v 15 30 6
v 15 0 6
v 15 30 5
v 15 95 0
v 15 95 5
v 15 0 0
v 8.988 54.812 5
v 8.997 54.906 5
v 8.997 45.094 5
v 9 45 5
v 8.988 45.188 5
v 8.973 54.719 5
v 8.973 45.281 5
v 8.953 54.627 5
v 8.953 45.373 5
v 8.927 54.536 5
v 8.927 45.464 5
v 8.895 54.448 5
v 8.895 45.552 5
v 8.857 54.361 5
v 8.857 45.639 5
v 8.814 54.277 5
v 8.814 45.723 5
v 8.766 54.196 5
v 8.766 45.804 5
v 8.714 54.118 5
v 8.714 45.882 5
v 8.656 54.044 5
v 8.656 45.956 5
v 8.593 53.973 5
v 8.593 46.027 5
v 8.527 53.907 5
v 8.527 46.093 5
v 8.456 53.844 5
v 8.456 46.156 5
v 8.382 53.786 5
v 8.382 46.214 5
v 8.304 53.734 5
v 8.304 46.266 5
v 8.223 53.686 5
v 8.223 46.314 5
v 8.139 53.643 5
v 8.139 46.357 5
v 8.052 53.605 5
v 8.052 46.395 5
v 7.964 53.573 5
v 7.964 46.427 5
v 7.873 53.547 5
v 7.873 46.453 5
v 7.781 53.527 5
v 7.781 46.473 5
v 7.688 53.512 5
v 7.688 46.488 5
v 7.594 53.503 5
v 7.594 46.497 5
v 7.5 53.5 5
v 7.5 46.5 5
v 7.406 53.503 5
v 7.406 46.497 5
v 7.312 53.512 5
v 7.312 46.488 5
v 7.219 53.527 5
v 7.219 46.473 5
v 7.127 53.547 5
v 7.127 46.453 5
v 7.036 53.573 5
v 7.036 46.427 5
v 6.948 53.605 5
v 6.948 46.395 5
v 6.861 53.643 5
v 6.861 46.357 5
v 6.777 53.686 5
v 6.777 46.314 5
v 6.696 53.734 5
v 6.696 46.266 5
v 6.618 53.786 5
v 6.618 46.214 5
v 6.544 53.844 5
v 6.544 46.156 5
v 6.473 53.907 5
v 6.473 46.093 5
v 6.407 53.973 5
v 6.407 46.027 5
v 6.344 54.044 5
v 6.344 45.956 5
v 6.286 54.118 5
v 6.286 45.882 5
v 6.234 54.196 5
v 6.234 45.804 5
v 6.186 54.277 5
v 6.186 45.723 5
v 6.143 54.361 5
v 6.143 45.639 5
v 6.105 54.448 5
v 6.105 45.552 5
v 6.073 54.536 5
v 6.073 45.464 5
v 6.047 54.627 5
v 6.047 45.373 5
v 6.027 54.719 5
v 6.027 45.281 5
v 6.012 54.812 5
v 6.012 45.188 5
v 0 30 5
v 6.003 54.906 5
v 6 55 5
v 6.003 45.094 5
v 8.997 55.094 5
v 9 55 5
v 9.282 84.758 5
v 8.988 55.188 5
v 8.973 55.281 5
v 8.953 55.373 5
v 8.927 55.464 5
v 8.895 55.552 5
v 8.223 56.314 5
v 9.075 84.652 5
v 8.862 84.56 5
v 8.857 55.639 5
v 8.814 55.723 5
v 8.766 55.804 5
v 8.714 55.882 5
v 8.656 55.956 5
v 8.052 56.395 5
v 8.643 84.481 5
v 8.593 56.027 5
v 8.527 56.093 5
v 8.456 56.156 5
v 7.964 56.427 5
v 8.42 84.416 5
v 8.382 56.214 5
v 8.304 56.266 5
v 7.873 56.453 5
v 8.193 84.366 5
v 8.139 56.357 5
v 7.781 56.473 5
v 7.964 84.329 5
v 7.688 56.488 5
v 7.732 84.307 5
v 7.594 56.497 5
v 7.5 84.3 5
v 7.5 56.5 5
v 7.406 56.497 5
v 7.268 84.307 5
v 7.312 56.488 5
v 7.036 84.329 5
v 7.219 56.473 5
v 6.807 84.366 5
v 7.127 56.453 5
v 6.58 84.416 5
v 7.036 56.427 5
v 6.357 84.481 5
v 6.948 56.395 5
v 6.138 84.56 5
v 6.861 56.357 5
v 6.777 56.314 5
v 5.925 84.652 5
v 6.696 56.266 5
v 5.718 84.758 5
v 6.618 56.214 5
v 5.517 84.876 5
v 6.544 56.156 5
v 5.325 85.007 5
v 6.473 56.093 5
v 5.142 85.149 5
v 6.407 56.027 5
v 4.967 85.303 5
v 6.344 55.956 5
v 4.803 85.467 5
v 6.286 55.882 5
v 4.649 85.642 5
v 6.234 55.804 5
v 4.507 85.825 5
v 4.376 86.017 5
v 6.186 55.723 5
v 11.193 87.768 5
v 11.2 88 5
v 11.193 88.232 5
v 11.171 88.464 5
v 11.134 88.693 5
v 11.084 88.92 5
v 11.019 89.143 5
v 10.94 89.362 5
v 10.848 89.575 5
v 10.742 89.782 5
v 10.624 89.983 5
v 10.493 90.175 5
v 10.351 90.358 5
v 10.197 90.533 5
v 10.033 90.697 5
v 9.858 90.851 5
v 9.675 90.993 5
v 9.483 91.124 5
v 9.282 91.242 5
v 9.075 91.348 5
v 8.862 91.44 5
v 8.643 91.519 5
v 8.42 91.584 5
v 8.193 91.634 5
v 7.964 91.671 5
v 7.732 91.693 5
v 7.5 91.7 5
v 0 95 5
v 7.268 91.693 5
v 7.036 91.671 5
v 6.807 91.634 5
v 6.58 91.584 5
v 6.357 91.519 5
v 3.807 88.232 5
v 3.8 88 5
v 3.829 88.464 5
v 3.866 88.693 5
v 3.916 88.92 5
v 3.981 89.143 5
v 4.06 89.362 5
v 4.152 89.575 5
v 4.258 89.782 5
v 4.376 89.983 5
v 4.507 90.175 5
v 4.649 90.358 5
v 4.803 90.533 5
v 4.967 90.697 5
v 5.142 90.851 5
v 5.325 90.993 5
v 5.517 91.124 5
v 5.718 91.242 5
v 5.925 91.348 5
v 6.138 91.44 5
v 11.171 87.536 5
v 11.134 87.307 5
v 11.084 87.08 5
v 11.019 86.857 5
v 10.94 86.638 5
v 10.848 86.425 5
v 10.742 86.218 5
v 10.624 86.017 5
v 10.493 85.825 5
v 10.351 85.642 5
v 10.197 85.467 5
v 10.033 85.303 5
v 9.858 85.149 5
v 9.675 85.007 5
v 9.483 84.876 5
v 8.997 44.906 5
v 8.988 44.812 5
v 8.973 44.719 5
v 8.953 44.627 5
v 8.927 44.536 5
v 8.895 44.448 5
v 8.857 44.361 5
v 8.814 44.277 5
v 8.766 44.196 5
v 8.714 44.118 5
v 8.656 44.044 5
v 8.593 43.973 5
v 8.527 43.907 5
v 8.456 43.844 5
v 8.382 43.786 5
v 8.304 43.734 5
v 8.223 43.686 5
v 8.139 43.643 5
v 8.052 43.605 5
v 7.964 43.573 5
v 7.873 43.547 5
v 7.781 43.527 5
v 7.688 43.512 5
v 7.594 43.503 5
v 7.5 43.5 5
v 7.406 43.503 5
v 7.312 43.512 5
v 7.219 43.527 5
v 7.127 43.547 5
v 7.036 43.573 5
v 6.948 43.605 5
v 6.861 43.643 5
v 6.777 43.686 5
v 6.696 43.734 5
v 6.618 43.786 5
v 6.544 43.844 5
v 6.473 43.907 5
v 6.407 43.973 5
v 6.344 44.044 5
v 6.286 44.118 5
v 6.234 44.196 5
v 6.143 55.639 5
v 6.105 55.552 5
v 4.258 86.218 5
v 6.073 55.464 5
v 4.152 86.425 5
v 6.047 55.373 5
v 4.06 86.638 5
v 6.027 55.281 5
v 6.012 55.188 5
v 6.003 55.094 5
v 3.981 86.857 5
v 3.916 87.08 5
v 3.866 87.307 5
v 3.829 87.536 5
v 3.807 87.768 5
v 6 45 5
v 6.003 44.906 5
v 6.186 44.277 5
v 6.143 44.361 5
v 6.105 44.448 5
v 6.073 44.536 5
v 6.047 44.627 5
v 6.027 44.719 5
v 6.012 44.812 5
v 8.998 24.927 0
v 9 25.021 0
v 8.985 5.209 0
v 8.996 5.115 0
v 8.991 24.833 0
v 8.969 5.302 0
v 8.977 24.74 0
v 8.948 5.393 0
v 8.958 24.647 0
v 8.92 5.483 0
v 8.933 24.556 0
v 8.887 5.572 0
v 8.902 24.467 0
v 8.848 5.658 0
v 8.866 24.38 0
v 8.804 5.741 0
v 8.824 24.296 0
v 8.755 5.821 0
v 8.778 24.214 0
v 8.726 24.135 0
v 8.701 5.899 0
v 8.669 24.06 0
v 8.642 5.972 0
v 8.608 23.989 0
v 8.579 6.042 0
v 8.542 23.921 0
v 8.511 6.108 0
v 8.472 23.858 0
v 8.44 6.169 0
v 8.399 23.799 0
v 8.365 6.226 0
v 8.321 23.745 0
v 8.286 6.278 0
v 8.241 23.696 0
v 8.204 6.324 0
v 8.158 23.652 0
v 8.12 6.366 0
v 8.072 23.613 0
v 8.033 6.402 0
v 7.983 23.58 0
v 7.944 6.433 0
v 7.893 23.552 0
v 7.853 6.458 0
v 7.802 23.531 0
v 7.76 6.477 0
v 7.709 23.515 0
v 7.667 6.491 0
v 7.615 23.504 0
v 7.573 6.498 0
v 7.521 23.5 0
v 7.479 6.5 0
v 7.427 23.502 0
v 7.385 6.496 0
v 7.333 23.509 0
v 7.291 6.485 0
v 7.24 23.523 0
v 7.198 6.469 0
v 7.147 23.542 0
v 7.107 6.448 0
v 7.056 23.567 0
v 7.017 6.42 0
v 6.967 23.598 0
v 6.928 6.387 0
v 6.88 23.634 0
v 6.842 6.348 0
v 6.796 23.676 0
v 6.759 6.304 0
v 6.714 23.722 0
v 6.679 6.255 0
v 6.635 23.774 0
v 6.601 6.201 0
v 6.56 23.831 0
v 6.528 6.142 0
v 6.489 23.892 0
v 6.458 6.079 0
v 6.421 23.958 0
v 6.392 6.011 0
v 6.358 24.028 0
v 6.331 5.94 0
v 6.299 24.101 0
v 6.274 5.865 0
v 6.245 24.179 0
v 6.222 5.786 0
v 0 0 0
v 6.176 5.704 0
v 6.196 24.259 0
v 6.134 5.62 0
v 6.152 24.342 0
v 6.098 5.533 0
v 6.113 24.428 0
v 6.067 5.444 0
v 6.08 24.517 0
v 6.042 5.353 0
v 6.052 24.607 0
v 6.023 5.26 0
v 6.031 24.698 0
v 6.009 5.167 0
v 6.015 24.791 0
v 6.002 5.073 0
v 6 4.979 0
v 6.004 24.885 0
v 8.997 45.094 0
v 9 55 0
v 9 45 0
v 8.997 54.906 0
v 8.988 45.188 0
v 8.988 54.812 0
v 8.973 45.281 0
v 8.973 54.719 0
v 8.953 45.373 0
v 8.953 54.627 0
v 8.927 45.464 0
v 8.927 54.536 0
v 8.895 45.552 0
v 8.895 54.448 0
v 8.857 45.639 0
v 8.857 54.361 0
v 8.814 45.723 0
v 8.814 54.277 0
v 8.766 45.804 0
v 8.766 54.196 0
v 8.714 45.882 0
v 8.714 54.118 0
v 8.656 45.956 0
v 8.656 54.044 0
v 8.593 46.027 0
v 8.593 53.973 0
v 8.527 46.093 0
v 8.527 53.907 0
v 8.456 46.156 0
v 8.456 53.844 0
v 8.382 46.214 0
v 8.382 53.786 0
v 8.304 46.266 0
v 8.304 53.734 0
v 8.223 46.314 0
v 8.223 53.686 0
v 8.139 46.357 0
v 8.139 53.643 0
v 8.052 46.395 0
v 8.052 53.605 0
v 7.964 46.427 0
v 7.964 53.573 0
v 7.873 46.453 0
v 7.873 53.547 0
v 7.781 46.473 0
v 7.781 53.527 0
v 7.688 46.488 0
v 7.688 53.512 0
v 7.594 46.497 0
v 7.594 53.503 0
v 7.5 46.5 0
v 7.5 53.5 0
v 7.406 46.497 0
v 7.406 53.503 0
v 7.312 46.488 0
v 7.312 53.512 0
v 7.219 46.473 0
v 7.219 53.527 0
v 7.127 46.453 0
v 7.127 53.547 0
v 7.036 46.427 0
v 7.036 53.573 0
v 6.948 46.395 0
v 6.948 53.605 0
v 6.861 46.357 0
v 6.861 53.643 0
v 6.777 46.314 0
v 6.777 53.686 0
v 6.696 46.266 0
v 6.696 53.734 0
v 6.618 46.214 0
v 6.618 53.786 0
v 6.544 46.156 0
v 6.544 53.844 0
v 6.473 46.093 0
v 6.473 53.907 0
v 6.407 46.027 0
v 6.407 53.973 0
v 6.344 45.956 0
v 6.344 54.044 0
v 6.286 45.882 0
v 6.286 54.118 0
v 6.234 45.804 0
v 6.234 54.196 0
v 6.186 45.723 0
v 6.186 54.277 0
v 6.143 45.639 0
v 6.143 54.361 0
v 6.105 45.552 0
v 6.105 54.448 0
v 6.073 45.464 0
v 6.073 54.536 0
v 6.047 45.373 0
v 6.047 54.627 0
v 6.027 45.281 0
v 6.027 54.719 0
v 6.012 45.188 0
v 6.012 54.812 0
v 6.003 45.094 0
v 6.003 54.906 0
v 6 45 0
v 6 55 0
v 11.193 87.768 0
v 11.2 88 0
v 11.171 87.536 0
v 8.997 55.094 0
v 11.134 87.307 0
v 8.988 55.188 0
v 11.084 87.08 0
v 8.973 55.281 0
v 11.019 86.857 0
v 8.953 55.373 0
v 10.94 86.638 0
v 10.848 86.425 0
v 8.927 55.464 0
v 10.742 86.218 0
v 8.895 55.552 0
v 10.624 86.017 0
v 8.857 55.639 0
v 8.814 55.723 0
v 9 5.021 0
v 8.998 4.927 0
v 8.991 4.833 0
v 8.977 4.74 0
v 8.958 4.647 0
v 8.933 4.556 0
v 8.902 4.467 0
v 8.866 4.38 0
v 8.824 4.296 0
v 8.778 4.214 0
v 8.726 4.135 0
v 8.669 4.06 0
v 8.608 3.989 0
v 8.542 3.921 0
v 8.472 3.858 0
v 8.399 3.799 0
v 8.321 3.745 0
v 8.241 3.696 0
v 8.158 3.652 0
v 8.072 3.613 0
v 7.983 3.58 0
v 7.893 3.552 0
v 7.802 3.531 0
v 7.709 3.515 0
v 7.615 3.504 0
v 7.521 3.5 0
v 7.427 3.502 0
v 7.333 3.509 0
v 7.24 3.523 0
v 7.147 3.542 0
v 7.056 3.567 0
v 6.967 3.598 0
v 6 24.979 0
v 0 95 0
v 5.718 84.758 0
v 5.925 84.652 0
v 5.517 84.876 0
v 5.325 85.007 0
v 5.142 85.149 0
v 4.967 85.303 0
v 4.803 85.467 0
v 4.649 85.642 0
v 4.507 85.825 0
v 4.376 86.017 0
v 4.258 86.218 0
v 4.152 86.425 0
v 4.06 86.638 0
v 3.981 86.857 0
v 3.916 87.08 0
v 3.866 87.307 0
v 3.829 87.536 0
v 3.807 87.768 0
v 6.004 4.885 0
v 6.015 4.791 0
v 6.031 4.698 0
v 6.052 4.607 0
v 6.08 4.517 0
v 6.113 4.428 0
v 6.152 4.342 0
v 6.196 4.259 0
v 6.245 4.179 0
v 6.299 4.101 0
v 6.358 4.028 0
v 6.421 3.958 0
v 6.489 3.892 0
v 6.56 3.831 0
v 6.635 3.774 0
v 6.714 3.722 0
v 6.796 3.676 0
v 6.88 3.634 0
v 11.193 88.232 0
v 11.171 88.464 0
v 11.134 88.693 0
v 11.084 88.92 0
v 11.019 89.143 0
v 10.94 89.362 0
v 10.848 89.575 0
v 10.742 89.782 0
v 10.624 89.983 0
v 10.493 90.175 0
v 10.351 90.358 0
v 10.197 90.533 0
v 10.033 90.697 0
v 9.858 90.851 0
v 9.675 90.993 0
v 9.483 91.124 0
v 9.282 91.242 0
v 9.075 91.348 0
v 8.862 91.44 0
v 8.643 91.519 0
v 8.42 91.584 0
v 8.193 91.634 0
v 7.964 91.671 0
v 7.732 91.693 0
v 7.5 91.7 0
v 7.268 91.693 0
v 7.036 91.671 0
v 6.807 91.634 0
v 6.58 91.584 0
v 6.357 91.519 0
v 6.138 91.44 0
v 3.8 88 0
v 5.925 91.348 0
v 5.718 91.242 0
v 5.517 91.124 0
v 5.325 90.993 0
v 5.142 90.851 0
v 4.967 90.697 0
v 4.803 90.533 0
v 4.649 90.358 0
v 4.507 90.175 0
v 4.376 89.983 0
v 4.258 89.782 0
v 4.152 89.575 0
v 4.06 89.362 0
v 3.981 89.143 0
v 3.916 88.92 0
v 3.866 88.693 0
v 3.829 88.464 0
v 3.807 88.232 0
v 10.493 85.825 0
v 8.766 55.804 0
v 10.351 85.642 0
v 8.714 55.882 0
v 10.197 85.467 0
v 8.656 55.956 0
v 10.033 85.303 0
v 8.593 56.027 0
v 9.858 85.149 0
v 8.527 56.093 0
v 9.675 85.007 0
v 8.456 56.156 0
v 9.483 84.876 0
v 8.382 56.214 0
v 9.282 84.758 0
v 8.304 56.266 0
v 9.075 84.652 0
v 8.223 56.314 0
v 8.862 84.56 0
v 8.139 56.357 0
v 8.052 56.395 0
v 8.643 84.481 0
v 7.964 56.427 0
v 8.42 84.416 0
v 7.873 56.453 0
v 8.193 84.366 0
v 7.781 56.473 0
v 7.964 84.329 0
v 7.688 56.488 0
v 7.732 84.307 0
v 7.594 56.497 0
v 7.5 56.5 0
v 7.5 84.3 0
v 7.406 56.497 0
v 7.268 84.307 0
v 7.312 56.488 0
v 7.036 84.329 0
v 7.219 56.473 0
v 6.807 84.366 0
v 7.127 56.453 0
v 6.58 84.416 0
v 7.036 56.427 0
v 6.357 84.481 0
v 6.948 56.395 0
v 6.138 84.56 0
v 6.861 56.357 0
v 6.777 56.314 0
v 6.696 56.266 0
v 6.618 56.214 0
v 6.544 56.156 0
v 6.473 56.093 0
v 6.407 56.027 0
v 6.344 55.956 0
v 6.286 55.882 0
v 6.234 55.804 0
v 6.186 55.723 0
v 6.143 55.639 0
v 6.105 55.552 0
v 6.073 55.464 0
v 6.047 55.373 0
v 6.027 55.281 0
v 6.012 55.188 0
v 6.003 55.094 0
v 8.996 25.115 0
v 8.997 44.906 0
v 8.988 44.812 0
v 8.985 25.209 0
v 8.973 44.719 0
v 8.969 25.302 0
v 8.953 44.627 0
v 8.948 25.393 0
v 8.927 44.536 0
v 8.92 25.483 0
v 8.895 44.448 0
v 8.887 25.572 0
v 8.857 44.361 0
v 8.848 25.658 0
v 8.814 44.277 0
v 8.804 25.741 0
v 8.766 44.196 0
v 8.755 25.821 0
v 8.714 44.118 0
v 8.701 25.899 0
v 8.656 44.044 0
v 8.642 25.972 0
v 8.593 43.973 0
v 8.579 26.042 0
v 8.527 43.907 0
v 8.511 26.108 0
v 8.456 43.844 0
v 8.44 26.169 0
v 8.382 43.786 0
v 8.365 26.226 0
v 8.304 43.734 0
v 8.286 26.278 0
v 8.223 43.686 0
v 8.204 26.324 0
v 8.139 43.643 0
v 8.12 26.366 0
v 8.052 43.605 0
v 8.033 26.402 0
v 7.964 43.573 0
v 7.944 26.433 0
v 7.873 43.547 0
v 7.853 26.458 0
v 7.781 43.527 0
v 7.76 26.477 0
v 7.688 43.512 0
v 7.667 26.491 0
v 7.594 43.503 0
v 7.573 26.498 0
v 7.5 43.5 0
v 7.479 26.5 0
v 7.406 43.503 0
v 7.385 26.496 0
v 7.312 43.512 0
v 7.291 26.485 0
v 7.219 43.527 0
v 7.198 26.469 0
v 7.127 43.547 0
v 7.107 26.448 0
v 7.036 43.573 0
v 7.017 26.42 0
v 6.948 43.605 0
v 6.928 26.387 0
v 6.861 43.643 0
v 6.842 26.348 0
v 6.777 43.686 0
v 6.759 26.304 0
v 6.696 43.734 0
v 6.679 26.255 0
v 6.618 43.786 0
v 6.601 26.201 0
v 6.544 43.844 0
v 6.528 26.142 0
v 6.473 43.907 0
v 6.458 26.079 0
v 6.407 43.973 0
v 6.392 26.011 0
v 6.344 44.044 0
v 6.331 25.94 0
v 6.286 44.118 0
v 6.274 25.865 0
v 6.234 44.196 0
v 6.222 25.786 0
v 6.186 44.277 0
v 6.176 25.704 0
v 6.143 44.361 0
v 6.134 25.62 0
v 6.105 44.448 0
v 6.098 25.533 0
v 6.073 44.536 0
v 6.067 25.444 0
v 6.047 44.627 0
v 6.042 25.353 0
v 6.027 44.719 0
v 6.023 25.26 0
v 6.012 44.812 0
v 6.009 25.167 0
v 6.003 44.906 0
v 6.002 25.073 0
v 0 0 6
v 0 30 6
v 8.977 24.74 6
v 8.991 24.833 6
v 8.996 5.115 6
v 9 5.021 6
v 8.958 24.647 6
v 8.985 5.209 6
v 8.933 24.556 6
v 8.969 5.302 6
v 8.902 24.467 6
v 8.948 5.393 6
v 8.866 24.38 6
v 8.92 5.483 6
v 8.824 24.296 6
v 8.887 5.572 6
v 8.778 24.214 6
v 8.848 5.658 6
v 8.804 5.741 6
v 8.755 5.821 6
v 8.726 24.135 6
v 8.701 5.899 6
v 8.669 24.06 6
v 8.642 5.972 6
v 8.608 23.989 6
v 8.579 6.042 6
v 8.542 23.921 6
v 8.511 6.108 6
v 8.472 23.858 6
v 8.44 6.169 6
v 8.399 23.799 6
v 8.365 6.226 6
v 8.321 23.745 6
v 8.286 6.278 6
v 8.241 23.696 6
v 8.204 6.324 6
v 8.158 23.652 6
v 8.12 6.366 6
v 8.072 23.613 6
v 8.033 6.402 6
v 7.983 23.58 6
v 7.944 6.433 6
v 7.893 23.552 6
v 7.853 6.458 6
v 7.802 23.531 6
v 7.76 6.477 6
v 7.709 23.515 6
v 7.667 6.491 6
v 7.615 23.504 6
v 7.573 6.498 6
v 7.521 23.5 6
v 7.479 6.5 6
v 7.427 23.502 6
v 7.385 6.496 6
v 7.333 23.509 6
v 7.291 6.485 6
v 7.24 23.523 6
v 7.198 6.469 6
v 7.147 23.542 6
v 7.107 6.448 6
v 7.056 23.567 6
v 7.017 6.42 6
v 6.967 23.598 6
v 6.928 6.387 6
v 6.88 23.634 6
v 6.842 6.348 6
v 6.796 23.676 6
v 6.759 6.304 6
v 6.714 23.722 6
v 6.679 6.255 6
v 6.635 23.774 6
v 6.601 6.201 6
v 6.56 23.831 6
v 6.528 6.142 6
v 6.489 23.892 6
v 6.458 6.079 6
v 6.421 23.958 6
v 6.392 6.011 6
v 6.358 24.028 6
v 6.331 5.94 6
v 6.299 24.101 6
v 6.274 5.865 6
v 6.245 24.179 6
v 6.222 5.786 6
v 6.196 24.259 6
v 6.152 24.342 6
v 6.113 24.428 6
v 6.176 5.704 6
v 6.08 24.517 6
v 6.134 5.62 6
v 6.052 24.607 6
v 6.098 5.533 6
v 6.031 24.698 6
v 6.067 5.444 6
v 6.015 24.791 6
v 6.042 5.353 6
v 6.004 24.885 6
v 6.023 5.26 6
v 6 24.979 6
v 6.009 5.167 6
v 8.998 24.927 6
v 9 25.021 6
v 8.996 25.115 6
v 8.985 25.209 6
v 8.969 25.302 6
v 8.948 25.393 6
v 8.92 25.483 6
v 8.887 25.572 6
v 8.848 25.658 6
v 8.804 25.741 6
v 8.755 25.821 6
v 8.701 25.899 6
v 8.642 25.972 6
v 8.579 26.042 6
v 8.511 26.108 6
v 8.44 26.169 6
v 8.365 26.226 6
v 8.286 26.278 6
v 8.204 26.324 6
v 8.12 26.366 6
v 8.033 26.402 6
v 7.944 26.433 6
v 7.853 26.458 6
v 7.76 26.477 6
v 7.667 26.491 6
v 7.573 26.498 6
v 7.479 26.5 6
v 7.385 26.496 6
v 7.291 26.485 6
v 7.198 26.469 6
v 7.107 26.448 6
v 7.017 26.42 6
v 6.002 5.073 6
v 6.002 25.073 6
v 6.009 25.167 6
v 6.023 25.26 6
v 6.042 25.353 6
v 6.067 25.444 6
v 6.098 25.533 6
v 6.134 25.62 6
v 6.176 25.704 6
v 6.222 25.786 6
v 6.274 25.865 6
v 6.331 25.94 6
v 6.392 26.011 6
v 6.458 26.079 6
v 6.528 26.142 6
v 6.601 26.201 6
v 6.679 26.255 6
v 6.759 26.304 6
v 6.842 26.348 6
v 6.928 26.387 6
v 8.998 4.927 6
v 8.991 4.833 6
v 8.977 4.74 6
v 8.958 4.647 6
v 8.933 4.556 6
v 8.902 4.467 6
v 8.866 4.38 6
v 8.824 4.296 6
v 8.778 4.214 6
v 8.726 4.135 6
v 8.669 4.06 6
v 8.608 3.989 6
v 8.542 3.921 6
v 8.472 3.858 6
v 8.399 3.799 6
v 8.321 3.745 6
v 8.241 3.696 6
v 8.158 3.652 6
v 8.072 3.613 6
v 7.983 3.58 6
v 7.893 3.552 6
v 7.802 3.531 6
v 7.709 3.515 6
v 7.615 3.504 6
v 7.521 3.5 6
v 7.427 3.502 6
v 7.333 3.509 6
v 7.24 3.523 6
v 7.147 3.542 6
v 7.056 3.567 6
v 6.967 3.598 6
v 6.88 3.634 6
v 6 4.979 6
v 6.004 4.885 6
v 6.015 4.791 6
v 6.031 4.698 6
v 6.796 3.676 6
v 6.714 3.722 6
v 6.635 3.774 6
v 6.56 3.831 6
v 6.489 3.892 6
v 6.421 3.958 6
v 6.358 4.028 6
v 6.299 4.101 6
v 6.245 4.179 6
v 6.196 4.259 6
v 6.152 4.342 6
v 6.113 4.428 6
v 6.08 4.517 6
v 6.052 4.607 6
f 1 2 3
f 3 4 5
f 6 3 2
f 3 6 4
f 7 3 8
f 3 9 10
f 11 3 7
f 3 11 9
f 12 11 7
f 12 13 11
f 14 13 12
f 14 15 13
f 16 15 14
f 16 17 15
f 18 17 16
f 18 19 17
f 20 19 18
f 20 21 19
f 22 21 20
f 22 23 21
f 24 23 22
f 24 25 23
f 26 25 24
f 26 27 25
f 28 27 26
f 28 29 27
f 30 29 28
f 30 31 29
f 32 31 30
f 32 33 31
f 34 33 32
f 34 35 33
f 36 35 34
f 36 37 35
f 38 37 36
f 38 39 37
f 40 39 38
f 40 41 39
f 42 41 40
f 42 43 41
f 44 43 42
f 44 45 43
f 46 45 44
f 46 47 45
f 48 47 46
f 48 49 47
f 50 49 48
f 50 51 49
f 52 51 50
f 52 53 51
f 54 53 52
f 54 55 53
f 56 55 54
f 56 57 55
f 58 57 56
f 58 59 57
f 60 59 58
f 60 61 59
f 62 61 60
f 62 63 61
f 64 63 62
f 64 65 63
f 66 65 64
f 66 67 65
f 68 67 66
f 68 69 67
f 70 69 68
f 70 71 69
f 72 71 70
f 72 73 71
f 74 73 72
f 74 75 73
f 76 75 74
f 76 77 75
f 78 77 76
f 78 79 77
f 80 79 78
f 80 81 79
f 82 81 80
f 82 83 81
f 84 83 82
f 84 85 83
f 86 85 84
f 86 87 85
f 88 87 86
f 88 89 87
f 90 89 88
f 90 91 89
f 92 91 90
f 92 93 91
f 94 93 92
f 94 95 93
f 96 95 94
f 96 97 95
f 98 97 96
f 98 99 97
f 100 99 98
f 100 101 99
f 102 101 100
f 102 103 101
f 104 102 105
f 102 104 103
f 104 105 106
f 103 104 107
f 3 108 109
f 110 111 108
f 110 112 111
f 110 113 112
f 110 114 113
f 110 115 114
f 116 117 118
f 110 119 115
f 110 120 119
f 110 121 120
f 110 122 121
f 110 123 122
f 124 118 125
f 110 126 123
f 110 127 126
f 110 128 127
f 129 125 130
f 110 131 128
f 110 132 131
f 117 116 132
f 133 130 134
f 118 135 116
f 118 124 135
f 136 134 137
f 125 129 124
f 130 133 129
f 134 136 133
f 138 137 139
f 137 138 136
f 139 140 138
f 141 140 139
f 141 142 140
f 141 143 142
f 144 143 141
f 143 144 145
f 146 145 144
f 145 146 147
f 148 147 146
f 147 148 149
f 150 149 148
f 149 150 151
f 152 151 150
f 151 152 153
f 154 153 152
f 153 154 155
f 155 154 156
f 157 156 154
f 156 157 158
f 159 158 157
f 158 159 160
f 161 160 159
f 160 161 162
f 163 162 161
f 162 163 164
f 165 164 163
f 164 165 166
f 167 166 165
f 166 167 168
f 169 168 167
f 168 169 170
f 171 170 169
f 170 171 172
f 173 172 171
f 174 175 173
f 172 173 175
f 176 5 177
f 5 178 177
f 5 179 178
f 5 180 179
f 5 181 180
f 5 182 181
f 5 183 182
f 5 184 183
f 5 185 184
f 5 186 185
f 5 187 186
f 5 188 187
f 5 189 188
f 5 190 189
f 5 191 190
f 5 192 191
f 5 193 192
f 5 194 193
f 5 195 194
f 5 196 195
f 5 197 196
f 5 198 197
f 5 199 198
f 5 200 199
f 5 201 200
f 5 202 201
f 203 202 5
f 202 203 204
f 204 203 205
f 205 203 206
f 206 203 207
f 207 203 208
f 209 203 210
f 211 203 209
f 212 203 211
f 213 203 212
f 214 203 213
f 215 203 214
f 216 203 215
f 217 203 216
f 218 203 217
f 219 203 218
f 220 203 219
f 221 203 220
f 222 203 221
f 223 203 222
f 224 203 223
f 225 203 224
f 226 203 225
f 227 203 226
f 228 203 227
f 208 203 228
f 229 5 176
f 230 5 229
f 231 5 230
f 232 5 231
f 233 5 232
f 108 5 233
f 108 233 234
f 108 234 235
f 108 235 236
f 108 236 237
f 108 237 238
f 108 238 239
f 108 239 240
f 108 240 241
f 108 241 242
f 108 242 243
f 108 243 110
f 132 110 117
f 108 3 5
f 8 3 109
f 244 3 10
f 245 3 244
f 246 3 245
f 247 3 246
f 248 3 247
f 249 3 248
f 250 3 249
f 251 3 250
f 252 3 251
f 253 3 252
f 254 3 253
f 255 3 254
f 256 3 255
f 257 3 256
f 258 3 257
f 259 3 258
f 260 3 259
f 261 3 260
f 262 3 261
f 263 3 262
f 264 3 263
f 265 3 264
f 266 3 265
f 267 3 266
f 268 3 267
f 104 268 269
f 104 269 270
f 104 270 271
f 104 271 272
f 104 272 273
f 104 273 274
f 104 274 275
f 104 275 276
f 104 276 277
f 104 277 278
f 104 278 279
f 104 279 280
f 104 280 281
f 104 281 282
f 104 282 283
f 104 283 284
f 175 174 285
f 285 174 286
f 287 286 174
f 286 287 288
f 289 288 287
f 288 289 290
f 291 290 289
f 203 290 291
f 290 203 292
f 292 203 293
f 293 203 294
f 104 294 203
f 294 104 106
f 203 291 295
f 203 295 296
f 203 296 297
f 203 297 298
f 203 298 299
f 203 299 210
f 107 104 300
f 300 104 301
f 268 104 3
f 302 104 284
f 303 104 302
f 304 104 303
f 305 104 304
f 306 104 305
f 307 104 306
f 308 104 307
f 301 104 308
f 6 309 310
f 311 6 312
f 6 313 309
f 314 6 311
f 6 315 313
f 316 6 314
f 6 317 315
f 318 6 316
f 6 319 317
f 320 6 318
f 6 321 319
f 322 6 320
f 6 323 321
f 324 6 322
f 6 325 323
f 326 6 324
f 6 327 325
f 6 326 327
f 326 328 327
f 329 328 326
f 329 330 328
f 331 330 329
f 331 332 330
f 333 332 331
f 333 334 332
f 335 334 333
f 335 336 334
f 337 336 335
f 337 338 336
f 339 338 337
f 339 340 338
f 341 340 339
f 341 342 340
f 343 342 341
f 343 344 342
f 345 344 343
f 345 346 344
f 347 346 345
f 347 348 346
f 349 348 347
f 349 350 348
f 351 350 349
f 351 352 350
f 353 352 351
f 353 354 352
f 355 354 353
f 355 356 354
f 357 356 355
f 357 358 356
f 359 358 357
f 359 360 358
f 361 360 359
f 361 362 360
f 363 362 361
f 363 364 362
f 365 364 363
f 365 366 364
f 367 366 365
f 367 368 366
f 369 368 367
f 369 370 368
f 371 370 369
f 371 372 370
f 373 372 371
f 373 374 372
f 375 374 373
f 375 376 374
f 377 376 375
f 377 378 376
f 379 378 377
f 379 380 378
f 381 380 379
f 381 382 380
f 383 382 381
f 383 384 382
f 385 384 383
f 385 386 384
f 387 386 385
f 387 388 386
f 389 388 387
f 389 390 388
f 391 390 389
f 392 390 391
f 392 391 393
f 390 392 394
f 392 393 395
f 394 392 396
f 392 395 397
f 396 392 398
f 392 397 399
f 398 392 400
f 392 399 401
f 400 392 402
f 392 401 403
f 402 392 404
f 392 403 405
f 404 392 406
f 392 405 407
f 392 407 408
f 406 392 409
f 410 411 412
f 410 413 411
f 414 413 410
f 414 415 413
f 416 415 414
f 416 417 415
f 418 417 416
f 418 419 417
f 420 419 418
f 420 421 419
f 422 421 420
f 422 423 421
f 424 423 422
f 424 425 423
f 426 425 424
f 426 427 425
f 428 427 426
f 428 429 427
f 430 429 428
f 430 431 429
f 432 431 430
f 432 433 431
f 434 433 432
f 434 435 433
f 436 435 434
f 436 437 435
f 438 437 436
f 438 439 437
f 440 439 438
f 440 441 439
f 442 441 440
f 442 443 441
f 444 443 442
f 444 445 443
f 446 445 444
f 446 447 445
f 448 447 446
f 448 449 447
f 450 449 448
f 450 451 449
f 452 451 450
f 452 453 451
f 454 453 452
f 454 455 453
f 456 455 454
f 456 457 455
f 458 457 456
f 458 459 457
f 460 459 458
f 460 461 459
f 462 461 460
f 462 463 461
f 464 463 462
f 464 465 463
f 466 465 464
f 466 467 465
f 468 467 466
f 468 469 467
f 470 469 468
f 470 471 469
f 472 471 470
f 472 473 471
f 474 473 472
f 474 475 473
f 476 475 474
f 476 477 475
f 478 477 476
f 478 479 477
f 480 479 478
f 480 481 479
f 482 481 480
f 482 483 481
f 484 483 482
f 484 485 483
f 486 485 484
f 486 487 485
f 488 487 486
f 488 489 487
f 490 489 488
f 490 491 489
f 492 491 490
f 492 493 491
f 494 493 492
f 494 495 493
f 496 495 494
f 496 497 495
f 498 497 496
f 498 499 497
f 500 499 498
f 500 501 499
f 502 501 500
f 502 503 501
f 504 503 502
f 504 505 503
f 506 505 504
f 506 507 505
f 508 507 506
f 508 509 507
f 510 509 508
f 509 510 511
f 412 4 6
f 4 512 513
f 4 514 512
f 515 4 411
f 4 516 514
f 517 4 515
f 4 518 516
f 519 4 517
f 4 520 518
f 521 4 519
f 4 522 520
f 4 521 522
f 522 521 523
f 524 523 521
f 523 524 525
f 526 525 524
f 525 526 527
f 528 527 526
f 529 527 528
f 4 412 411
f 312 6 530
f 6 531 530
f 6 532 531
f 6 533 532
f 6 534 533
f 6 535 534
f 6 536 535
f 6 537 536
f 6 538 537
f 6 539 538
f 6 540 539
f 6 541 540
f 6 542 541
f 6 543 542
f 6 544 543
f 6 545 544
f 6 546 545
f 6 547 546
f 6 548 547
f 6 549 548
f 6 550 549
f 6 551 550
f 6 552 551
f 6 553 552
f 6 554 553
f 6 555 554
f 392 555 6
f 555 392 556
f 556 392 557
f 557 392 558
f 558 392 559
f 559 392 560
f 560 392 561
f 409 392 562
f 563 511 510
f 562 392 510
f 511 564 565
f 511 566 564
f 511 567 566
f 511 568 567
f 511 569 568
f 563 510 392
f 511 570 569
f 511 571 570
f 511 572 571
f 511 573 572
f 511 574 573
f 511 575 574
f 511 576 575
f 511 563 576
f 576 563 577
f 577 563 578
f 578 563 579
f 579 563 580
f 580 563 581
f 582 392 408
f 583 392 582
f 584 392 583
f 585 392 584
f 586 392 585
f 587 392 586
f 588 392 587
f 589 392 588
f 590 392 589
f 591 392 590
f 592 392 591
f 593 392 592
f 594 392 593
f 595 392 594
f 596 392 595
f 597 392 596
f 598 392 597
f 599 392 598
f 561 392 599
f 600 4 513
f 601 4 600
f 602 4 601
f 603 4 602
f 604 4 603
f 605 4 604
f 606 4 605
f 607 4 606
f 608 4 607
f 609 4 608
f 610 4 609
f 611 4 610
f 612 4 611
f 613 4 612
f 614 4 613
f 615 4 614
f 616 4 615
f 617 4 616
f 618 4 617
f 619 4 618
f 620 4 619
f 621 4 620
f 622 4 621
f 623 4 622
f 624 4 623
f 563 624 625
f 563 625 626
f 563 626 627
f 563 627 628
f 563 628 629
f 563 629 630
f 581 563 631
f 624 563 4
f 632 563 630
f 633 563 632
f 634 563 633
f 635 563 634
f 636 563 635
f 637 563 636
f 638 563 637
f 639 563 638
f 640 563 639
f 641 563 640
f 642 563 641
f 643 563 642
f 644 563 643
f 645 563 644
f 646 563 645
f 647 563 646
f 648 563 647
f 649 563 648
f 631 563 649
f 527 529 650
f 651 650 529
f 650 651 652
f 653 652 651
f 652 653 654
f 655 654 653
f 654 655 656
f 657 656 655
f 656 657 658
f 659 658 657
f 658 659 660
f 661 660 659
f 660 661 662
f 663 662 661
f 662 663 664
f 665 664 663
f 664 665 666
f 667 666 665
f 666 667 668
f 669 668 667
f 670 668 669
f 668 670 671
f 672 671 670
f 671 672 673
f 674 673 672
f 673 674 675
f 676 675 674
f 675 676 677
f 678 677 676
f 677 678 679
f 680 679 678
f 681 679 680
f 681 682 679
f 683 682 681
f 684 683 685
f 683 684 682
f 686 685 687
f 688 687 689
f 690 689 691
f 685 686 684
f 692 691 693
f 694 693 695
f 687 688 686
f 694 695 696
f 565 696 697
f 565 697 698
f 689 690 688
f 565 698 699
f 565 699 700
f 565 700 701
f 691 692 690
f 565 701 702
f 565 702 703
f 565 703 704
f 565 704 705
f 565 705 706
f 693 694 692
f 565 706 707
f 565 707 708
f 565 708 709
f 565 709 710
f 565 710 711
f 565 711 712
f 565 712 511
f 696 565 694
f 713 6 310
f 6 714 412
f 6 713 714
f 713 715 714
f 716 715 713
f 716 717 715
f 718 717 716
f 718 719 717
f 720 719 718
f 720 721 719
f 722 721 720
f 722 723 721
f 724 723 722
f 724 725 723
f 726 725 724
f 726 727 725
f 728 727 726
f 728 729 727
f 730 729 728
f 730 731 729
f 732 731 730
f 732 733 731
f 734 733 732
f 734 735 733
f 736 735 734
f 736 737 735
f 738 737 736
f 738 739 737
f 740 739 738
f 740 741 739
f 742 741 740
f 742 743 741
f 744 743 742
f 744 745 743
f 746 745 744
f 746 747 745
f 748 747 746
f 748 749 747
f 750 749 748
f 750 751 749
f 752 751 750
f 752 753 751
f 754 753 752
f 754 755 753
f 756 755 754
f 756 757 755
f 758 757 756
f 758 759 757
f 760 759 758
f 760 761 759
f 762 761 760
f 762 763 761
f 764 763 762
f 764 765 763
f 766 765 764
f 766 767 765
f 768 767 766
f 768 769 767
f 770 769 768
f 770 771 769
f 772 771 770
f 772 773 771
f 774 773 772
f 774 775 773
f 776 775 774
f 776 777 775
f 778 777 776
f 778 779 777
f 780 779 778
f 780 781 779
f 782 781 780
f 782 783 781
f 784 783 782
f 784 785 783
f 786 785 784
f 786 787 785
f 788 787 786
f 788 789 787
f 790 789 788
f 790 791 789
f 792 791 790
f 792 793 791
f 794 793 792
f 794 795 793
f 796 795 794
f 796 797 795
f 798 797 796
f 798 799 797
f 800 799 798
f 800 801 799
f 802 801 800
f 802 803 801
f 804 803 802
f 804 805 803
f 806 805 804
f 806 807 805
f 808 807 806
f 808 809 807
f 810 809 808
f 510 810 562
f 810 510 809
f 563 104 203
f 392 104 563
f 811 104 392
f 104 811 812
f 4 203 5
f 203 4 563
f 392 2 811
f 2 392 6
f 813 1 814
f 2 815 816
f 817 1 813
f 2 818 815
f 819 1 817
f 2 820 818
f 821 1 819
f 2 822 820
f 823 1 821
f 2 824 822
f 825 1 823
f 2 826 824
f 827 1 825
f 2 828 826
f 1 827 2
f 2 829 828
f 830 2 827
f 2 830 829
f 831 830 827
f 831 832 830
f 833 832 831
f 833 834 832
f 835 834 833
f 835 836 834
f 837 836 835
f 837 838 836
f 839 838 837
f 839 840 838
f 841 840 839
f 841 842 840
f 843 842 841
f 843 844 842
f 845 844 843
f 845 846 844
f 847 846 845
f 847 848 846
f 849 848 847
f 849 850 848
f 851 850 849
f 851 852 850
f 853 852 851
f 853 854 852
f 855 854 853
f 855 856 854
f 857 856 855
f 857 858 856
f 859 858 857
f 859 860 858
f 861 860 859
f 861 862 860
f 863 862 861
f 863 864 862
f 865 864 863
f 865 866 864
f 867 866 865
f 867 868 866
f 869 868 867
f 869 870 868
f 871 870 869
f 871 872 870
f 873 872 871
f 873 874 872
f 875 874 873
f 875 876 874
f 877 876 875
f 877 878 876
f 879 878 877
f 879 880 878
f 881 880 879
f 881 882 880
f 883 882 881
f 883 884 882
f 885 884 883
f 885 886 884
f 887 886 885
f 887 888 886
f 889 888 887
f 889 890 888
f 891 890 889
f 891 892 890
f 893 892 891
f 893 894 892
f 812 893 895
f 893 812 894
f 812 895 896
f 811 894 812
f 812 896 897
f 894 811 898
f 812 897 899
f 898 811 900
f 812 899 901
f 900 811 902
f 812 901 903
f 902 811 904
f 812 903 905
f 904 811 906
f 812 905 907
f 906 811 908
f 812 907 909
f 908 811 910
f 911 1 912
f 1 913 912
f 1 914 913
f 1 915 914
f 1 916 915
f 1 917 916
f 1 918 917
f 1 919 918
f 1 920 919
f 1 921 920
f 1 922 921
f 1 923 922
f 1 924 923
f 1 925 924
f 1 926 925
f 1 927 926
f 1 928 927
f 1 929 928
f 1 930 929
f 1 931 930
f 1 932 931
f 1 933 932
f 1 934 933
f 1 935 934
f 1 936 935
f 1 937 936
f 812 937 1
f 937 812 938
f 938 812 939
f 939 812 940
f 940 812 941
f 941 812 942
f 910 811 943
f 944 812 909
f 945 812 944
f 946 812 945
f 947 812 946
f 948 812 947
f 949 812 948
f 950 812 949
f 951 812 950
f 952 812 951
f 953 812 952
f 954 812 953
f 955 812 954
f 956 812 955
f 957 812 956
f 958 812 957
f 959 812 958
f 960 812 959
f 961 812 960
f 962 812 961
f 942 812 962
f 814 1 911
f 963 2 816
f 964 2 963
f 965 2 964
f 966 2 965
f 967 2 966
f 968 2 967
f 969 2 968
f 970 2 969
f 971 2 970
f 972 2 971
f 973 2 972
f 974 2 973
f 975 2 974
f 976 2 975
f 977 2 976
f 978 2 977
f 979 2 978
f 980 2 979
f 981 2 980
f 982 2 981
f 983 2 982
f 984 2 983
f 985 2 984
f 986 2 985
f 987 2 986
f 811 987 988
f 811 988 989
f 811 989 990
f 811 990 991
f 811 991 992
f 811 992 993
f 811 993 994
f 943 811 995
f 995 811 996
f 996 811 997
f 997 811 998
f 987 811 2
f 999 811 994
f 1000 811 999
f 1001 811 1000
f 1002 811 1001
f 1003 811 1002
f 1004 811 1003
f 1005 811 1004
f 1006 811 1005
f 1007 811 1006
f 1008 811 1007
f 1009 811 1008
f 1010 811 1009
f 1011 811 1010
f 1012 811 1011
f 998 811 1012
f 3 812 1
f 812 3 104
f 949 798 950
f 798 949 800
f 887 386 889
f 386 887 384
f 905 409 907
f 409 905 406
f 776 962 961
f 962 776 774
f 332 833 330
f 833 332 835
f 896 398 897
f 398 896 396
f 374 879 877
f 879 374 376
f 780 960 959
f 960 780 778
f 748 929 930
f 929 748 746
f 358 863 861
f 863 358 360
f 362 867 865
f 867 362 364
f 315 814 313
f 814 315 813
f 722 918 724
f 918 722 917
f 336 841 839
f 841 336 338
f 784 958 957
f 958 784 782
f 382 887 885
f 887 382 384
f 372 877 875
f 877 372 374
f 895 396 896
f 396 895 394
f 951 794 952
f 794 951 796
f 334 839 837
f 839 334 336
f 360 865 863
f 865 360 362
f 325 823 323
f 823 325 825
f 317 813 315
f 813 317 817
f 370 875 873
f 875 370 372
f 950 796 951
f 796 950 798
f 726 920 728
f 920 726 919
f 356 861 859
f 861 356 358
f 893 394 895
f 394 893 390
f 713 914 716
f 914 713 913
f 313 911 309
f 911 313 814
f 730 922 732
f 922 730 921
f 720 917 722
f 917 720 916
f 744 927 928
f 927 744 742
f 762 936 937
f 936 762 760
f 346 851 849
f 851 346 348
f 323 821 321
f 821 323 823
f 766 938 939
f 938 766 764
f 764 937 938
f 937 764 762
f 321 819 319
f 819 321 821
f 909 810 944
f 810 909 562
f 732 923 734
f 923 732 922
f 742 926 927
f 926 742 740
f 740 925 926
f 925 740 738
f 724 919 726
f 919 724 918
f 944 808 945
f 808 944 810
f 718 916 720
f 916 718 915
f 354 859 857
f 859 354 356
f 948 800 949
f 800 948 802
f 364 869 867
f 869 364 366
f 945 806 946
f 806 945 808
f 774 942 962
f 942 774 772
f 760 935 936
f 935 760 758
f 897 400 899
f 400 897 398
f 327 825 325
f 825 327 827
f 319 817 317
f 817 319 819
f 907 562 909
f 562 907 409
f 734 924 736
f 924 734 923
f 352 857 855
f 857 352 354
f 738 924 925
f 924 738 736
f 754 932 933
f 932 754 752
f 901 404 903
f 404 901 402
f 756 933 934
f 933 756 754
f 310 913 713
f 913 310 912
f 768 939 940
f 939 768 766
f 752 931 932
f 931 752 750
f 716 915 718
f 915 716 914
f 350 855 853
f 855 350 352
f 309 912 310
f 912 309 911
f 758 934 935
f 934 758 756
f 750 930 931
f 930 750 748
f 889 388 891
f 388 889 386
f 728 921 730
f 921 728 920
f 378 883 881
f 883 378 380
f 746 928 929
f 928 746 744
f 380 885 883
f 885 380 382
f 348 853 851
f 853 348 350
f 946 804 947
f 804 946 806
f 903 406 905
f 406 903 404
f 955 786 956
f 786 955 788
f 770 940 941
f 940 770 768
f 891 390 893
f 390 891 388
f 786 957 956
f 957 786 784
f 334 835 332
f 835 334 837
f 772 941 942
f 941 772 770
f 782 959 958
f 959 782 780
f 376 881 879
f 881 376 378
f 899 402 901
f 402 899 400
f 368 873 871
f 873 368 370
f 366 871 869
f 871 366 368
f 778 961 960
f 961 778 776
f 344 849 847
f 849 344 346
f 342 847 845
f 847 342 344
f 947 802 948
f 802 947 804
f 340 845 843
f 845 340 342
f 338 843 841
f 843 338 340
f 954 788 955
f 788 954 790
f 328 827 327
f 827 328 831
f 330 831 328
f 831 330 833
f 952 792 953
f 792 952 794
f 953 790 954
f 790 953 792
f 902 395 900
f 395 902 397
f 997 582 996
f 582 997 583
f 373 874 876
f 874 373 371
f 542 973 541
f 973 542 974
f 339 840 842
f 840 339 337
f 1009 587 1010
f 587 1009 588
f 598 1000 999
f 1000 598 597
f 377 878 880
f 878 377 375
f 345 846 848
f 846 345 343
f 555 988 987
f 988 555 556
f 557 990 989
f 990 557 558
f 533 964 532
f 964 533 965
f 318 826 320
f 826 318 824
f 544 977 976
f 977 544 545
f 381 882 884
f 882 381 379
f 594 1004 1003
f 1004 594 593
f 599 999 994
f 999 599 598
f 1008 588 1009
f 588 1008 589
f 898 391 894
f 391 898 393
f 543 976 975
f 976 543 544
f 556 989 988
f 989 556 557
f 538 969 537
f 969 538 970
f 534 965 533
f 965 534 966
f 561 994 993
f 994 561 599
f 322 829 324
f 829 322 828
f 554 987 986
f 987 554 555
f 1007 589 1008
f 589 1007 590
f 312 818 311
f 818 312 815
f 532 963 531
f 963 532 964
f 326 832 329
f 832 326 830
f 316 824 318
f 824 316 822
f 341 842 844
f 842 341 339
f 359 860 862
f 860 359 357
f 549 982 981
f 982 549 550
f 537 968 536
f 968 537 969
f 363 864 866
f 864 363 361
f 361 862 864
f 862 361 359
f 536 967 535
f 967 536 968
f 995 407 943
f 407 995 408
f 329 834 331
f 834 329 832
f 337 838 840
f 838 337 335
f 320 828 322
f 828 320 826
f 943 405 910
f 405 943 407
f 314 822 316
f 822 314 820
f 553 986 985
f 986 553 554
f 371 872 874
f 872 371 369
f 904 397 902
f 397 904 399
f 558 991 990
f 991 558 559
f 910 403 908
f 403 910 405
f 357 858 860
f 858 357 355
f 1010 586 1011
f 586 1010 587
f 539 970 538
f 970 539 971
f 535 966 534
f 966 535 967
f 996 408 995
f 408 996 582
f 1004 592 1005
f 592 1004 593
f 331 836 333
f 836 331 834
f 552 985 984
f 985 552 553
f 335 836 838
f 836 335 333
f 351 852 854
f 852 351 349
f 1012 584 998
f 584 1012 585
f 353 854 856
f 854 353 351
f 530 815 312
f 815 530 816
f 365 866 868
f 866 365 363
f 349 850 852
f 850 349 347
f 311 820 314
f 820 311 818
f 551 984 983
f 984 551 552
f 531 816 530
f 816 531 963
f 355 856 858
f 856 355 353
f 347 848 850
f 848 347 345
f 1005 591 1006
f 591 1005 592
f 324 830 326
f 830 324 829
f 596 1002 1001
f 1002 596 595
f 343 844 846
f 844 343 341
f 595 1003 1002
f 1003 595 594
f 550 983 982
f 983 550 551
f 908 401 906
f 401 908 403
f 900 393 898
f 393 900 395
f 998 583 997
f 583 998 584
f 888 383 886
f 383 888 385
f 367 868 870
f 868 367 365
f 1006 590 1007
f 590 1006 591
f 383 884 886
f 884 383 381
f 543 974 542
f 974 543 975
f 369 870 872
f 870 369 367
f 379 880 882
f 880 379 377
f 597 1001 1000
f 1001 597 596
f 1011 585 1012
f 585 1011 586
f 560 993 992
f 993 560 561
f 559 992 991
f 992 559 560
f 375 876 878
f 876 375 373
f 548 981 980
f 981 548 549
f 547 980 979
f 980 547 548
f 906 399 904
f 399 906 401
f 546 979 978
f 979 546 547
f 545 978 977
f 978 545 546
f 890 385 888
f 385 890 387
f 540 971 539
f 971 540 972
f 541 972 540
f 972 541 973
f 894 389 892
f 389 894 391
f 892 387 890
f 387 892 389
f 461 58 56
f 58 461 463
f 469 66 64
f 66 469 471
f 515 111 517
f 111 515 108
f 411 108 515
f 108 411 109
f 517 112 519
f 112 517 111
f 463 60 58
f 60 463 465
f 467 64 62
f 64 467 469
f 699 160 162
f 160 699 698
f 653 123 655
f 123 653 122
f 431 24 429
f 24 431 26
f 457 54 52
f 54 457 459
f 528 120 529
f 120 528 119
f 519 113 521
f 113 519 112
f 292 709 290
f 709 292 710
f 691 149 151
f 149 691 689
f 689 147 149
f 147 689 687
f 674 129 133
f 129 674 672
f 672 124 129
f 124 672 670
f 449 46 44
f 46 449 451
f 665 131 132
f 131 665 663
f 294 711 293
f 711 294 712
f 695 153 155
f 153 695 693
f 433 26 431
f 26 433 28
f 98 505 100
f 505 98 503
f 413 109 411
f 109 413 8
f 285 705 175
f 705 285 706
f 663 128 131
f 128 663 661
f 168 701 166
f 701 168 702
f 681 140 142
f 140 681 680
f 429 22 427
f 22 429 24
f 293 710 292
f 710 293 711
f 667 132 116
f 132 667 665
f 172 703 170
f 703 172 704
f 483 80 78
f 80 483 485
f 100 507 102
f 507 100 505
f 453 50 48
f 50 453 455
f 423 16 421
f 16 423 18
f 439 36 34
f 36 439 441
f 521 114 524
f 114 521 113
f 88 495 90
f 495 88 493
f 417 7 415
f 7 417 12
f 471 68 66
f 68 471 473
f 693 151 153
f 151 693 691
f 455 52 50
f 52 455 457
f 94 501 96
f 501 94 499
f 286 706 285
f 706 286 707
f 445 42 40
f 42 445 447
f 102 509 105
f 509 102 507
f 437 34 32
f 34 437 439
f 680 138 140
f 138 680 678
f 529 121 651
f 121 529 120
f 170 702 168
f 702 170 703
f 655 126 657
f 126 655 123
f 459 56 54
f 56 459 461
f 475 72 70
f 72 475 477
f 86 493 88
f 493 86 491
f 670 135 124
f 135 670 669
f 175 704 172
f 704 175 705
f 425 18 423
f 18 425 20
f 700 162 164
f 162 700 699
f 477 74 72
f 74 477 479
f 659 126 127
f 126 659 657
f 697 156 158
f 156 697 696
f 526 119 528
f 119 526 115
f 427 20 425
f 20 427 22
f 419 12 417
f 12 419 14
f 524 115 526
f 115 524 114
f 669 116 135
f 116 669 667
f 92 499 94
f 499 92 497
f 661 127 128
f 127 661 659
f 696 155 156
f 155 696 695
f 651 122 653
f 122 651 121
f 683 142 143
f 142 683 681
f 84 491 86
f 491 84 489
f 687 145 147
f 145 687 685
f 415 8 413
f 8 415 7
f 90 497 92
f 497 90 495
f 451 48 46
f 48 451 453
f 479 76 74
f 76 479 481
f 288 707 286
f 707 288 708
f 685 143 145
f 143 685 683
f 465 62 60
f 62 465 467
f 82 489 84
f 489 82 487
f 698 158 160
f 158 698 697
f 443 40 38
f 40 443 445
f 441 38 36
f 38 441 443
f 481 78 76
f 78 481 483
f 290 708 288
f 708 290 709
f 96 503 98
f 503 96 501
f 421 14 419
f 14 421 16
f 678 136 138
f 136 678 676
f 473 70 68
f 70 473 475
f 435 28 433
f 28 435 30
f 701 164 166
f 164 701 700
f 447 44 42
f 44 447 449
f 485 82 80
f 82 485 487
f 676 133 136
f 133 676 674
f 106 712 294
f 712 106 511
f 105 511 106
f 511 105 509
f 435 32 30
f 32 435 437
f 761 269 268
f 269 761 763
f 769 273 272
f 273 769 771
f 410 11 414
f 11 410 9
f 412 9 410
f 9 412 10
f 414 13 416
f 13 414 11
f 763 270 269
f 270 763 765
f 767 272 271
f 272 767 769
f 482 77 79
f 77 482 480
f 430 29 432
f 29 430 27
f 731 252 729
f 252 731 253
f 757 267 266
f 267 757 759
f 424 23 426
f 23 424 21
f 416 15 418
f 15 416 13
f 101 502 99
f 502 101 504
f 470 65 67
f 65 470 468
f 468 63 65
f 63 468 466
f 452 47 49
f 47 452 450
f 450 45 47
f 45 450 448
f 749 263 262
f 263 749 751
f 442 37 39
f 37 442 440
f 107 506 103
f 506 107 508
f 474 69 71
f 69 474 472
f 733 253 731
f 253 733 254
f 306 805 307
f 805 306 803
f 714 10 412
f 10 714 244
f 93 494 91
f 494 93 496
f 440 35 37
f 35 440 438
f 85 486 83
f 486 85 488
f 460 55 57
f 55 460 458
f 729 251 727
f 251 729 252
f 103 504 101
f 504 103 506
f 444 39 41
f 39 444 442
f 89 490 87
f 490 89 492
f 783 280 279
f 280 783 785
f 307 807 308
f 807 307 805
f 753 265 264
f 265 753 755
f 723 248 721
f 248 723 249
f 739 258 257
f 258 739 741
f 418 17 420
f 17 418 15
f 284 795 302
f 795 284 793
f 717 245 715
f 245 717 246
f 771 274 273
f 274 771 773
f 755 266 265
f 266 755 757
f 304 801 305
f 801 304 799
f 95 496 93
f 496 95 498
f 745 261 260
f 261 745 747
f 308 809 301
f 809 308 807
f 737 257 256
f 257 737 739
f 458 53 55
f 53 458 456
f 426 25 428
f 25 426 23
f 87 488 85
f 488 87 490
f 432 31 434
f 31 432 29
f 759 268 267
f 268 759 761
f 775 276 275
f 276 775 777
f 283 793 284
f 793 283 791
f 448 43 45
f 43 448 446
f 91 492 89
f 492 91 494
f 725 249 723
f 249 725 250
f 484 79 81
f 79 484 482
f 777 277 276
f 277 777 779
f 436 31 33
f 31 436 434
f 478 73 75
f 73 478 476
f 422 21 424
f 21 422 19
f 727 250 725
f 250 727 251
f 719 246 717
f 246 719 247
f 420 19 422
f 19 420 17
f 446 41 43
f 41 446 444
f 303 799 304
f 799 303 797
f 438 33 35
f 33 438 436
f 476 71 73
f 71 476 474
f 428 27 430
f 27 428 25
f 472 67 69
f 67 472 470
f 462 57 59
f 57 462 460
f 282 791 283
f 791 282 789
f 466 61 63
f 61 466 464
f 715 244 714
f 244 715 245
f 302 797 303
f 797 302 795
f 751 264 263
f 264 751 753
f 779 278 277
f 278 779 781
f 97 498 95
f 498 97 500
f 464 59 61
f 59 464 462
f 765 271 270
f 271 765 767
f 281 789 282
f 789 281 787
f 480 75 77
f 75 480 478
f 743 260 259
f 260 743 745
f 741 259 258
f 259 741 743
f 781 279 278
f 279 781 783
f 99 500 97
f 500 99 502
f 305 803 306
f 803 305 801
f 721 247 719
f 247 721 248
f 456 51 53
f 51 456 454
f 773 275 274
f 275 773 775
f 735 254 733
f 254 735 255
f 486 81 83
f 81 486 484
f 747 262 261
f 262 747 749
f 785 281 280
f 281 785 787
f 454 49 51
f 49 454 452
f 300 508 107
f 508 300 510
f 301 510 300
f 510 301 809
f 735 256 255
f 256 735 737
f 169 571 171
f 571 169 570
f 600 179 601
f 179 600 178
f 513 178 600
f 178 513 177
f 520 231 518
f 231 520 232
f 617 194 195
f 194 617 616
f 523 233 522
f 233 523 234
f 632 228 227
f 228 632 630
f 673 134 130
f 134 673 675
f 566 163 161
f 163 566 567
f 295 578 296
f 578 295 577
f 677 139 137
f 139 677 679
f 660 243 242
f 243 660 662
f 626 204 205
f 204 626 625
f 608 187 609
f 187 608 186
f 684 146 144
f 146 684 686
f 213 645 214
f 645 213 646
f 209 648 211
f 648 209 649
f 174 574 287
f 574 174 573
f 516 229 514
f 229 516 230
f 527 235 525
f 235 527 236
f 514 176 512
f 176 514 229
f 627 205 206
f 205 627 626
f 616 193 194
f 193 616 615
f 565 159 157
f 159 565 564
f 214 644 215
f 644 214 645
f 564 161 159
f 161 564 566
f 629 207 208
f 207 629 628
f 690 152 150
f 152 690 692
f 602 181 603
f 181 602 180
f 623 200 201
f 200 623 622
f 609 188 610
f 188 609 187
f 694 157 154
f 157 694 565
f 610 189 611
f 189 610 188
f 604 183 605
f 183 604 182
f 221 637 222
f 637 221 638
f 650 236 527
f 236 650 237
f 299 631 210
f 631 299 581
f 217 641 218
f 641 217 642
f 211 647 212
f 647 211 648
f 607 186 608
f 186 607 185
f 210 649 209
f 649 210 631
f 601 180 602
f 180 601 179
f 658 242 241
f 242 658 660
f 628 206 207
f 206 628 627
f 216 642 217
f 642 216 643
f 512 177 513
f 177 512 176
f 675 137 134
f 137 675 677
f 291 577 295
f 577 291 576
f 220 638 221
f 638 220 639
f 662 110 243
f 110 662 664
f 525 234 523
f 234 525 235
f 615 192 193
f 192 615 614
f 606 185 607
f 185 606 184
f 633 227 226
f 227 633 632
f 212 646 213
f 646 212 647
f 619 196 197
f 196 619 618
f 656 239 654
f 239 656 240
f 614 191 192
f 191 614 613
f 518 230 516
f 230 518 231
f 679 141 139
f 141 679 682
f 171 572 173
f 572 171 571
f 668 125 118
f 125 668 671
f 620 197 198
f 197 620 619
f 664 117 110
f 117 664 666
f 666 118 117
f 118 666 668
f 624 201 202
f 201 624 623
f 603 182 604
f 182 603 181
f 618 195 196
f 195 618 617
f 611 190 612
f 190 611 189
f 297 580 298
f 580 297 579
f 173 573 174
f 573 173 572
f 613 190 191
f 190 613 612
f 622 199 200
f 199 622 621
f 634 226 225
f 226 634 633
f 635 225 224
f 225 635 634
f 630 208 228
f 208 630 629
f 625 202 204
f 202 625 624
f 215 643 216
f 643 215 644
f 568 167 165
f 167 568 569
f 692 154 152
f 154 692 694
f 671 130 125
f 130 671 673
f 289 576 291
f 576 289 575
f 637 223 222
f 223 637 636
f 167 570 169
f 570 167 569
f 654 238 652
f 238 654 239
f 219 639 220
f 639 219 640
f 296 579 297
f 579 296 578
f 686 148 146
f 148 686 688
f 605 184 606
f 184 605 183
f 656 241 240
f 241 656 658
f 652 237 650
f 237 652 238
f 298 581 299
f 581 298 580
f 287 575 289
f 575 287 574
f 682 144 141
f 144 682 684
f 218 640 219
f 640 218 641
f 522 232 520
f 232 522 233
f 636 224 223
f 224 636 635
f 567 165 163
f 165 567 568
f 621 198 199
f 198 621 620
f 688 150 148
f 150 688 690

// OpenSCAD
difference(){
	union(){        
        translate([0,0,0]){
           cube([15,95,5], center=false);
        }
        translate([0,0,1]){
           cube([15,30,5], center=false);
        }
	}
	union() {


        translate([7.5,25,-5]){
            rotate(a = [0,0,-10]) {
                cylinder(h=500, r=1.5, $fn=100, center=false);
            }
        }	
        translate([7.5,5,-5]){
            rotate(a = [0,0,-10]) {
                cylinder(h=500, r=1.5, $fn=100, center=false);
            }
        }	




        translate([7.5,55,-10]){
            rotate(a = [0,0,0]) {
                cylinder(h=400, r=1.5, $fn=100, center=false);
            }
        }	
        translate([7.5,45,-10]){
            rotate(a = [0,0,0]) {
                cylinder(h=400, r=1.5, $fn=100, center=false);
            }
        }	


/*
        translate([-10,10,10]){
            rotate(a = [90,0,0]) {
                cylinder(h=30, r=1, $fn=100, center=true);
            }
        }	

        translate([-10,10,30]){
            rotate(a = [90,0,0]) {
                cylinder(h=30, r=1, $fn=100, center=true);
            }
        }	

        translate([25,10,10]){
            rotate(a = [90,0,0]) {
                cylinder(h=30, r=1, $fn=100, center=true);
            }
        }	

        translate([25,10,30]){
            rotate(a = [90,0,0]) {
                cylinder(h=30, r=1, $fn=100, center=true);
            }
        }	




        translate([7.5,40,-10]){
            rotate(a = [0,0,0]) {
                cylinder(h=400, r=1.5, $fn=100, center=false);
            }
        }	
        translate([7.5,30,-10]){
            rotate(a = [0,0,0]) {
                cylinder(h=400, r=1.5, $fn=100, center=false);
            }
        }	


*/

        translate([7.5,88,-10]){
            rotate(a = [0,0,0]) {
                cylinder(h=400, r=3.7, $fn=100, center=false);
            }
        }	


	}
}
